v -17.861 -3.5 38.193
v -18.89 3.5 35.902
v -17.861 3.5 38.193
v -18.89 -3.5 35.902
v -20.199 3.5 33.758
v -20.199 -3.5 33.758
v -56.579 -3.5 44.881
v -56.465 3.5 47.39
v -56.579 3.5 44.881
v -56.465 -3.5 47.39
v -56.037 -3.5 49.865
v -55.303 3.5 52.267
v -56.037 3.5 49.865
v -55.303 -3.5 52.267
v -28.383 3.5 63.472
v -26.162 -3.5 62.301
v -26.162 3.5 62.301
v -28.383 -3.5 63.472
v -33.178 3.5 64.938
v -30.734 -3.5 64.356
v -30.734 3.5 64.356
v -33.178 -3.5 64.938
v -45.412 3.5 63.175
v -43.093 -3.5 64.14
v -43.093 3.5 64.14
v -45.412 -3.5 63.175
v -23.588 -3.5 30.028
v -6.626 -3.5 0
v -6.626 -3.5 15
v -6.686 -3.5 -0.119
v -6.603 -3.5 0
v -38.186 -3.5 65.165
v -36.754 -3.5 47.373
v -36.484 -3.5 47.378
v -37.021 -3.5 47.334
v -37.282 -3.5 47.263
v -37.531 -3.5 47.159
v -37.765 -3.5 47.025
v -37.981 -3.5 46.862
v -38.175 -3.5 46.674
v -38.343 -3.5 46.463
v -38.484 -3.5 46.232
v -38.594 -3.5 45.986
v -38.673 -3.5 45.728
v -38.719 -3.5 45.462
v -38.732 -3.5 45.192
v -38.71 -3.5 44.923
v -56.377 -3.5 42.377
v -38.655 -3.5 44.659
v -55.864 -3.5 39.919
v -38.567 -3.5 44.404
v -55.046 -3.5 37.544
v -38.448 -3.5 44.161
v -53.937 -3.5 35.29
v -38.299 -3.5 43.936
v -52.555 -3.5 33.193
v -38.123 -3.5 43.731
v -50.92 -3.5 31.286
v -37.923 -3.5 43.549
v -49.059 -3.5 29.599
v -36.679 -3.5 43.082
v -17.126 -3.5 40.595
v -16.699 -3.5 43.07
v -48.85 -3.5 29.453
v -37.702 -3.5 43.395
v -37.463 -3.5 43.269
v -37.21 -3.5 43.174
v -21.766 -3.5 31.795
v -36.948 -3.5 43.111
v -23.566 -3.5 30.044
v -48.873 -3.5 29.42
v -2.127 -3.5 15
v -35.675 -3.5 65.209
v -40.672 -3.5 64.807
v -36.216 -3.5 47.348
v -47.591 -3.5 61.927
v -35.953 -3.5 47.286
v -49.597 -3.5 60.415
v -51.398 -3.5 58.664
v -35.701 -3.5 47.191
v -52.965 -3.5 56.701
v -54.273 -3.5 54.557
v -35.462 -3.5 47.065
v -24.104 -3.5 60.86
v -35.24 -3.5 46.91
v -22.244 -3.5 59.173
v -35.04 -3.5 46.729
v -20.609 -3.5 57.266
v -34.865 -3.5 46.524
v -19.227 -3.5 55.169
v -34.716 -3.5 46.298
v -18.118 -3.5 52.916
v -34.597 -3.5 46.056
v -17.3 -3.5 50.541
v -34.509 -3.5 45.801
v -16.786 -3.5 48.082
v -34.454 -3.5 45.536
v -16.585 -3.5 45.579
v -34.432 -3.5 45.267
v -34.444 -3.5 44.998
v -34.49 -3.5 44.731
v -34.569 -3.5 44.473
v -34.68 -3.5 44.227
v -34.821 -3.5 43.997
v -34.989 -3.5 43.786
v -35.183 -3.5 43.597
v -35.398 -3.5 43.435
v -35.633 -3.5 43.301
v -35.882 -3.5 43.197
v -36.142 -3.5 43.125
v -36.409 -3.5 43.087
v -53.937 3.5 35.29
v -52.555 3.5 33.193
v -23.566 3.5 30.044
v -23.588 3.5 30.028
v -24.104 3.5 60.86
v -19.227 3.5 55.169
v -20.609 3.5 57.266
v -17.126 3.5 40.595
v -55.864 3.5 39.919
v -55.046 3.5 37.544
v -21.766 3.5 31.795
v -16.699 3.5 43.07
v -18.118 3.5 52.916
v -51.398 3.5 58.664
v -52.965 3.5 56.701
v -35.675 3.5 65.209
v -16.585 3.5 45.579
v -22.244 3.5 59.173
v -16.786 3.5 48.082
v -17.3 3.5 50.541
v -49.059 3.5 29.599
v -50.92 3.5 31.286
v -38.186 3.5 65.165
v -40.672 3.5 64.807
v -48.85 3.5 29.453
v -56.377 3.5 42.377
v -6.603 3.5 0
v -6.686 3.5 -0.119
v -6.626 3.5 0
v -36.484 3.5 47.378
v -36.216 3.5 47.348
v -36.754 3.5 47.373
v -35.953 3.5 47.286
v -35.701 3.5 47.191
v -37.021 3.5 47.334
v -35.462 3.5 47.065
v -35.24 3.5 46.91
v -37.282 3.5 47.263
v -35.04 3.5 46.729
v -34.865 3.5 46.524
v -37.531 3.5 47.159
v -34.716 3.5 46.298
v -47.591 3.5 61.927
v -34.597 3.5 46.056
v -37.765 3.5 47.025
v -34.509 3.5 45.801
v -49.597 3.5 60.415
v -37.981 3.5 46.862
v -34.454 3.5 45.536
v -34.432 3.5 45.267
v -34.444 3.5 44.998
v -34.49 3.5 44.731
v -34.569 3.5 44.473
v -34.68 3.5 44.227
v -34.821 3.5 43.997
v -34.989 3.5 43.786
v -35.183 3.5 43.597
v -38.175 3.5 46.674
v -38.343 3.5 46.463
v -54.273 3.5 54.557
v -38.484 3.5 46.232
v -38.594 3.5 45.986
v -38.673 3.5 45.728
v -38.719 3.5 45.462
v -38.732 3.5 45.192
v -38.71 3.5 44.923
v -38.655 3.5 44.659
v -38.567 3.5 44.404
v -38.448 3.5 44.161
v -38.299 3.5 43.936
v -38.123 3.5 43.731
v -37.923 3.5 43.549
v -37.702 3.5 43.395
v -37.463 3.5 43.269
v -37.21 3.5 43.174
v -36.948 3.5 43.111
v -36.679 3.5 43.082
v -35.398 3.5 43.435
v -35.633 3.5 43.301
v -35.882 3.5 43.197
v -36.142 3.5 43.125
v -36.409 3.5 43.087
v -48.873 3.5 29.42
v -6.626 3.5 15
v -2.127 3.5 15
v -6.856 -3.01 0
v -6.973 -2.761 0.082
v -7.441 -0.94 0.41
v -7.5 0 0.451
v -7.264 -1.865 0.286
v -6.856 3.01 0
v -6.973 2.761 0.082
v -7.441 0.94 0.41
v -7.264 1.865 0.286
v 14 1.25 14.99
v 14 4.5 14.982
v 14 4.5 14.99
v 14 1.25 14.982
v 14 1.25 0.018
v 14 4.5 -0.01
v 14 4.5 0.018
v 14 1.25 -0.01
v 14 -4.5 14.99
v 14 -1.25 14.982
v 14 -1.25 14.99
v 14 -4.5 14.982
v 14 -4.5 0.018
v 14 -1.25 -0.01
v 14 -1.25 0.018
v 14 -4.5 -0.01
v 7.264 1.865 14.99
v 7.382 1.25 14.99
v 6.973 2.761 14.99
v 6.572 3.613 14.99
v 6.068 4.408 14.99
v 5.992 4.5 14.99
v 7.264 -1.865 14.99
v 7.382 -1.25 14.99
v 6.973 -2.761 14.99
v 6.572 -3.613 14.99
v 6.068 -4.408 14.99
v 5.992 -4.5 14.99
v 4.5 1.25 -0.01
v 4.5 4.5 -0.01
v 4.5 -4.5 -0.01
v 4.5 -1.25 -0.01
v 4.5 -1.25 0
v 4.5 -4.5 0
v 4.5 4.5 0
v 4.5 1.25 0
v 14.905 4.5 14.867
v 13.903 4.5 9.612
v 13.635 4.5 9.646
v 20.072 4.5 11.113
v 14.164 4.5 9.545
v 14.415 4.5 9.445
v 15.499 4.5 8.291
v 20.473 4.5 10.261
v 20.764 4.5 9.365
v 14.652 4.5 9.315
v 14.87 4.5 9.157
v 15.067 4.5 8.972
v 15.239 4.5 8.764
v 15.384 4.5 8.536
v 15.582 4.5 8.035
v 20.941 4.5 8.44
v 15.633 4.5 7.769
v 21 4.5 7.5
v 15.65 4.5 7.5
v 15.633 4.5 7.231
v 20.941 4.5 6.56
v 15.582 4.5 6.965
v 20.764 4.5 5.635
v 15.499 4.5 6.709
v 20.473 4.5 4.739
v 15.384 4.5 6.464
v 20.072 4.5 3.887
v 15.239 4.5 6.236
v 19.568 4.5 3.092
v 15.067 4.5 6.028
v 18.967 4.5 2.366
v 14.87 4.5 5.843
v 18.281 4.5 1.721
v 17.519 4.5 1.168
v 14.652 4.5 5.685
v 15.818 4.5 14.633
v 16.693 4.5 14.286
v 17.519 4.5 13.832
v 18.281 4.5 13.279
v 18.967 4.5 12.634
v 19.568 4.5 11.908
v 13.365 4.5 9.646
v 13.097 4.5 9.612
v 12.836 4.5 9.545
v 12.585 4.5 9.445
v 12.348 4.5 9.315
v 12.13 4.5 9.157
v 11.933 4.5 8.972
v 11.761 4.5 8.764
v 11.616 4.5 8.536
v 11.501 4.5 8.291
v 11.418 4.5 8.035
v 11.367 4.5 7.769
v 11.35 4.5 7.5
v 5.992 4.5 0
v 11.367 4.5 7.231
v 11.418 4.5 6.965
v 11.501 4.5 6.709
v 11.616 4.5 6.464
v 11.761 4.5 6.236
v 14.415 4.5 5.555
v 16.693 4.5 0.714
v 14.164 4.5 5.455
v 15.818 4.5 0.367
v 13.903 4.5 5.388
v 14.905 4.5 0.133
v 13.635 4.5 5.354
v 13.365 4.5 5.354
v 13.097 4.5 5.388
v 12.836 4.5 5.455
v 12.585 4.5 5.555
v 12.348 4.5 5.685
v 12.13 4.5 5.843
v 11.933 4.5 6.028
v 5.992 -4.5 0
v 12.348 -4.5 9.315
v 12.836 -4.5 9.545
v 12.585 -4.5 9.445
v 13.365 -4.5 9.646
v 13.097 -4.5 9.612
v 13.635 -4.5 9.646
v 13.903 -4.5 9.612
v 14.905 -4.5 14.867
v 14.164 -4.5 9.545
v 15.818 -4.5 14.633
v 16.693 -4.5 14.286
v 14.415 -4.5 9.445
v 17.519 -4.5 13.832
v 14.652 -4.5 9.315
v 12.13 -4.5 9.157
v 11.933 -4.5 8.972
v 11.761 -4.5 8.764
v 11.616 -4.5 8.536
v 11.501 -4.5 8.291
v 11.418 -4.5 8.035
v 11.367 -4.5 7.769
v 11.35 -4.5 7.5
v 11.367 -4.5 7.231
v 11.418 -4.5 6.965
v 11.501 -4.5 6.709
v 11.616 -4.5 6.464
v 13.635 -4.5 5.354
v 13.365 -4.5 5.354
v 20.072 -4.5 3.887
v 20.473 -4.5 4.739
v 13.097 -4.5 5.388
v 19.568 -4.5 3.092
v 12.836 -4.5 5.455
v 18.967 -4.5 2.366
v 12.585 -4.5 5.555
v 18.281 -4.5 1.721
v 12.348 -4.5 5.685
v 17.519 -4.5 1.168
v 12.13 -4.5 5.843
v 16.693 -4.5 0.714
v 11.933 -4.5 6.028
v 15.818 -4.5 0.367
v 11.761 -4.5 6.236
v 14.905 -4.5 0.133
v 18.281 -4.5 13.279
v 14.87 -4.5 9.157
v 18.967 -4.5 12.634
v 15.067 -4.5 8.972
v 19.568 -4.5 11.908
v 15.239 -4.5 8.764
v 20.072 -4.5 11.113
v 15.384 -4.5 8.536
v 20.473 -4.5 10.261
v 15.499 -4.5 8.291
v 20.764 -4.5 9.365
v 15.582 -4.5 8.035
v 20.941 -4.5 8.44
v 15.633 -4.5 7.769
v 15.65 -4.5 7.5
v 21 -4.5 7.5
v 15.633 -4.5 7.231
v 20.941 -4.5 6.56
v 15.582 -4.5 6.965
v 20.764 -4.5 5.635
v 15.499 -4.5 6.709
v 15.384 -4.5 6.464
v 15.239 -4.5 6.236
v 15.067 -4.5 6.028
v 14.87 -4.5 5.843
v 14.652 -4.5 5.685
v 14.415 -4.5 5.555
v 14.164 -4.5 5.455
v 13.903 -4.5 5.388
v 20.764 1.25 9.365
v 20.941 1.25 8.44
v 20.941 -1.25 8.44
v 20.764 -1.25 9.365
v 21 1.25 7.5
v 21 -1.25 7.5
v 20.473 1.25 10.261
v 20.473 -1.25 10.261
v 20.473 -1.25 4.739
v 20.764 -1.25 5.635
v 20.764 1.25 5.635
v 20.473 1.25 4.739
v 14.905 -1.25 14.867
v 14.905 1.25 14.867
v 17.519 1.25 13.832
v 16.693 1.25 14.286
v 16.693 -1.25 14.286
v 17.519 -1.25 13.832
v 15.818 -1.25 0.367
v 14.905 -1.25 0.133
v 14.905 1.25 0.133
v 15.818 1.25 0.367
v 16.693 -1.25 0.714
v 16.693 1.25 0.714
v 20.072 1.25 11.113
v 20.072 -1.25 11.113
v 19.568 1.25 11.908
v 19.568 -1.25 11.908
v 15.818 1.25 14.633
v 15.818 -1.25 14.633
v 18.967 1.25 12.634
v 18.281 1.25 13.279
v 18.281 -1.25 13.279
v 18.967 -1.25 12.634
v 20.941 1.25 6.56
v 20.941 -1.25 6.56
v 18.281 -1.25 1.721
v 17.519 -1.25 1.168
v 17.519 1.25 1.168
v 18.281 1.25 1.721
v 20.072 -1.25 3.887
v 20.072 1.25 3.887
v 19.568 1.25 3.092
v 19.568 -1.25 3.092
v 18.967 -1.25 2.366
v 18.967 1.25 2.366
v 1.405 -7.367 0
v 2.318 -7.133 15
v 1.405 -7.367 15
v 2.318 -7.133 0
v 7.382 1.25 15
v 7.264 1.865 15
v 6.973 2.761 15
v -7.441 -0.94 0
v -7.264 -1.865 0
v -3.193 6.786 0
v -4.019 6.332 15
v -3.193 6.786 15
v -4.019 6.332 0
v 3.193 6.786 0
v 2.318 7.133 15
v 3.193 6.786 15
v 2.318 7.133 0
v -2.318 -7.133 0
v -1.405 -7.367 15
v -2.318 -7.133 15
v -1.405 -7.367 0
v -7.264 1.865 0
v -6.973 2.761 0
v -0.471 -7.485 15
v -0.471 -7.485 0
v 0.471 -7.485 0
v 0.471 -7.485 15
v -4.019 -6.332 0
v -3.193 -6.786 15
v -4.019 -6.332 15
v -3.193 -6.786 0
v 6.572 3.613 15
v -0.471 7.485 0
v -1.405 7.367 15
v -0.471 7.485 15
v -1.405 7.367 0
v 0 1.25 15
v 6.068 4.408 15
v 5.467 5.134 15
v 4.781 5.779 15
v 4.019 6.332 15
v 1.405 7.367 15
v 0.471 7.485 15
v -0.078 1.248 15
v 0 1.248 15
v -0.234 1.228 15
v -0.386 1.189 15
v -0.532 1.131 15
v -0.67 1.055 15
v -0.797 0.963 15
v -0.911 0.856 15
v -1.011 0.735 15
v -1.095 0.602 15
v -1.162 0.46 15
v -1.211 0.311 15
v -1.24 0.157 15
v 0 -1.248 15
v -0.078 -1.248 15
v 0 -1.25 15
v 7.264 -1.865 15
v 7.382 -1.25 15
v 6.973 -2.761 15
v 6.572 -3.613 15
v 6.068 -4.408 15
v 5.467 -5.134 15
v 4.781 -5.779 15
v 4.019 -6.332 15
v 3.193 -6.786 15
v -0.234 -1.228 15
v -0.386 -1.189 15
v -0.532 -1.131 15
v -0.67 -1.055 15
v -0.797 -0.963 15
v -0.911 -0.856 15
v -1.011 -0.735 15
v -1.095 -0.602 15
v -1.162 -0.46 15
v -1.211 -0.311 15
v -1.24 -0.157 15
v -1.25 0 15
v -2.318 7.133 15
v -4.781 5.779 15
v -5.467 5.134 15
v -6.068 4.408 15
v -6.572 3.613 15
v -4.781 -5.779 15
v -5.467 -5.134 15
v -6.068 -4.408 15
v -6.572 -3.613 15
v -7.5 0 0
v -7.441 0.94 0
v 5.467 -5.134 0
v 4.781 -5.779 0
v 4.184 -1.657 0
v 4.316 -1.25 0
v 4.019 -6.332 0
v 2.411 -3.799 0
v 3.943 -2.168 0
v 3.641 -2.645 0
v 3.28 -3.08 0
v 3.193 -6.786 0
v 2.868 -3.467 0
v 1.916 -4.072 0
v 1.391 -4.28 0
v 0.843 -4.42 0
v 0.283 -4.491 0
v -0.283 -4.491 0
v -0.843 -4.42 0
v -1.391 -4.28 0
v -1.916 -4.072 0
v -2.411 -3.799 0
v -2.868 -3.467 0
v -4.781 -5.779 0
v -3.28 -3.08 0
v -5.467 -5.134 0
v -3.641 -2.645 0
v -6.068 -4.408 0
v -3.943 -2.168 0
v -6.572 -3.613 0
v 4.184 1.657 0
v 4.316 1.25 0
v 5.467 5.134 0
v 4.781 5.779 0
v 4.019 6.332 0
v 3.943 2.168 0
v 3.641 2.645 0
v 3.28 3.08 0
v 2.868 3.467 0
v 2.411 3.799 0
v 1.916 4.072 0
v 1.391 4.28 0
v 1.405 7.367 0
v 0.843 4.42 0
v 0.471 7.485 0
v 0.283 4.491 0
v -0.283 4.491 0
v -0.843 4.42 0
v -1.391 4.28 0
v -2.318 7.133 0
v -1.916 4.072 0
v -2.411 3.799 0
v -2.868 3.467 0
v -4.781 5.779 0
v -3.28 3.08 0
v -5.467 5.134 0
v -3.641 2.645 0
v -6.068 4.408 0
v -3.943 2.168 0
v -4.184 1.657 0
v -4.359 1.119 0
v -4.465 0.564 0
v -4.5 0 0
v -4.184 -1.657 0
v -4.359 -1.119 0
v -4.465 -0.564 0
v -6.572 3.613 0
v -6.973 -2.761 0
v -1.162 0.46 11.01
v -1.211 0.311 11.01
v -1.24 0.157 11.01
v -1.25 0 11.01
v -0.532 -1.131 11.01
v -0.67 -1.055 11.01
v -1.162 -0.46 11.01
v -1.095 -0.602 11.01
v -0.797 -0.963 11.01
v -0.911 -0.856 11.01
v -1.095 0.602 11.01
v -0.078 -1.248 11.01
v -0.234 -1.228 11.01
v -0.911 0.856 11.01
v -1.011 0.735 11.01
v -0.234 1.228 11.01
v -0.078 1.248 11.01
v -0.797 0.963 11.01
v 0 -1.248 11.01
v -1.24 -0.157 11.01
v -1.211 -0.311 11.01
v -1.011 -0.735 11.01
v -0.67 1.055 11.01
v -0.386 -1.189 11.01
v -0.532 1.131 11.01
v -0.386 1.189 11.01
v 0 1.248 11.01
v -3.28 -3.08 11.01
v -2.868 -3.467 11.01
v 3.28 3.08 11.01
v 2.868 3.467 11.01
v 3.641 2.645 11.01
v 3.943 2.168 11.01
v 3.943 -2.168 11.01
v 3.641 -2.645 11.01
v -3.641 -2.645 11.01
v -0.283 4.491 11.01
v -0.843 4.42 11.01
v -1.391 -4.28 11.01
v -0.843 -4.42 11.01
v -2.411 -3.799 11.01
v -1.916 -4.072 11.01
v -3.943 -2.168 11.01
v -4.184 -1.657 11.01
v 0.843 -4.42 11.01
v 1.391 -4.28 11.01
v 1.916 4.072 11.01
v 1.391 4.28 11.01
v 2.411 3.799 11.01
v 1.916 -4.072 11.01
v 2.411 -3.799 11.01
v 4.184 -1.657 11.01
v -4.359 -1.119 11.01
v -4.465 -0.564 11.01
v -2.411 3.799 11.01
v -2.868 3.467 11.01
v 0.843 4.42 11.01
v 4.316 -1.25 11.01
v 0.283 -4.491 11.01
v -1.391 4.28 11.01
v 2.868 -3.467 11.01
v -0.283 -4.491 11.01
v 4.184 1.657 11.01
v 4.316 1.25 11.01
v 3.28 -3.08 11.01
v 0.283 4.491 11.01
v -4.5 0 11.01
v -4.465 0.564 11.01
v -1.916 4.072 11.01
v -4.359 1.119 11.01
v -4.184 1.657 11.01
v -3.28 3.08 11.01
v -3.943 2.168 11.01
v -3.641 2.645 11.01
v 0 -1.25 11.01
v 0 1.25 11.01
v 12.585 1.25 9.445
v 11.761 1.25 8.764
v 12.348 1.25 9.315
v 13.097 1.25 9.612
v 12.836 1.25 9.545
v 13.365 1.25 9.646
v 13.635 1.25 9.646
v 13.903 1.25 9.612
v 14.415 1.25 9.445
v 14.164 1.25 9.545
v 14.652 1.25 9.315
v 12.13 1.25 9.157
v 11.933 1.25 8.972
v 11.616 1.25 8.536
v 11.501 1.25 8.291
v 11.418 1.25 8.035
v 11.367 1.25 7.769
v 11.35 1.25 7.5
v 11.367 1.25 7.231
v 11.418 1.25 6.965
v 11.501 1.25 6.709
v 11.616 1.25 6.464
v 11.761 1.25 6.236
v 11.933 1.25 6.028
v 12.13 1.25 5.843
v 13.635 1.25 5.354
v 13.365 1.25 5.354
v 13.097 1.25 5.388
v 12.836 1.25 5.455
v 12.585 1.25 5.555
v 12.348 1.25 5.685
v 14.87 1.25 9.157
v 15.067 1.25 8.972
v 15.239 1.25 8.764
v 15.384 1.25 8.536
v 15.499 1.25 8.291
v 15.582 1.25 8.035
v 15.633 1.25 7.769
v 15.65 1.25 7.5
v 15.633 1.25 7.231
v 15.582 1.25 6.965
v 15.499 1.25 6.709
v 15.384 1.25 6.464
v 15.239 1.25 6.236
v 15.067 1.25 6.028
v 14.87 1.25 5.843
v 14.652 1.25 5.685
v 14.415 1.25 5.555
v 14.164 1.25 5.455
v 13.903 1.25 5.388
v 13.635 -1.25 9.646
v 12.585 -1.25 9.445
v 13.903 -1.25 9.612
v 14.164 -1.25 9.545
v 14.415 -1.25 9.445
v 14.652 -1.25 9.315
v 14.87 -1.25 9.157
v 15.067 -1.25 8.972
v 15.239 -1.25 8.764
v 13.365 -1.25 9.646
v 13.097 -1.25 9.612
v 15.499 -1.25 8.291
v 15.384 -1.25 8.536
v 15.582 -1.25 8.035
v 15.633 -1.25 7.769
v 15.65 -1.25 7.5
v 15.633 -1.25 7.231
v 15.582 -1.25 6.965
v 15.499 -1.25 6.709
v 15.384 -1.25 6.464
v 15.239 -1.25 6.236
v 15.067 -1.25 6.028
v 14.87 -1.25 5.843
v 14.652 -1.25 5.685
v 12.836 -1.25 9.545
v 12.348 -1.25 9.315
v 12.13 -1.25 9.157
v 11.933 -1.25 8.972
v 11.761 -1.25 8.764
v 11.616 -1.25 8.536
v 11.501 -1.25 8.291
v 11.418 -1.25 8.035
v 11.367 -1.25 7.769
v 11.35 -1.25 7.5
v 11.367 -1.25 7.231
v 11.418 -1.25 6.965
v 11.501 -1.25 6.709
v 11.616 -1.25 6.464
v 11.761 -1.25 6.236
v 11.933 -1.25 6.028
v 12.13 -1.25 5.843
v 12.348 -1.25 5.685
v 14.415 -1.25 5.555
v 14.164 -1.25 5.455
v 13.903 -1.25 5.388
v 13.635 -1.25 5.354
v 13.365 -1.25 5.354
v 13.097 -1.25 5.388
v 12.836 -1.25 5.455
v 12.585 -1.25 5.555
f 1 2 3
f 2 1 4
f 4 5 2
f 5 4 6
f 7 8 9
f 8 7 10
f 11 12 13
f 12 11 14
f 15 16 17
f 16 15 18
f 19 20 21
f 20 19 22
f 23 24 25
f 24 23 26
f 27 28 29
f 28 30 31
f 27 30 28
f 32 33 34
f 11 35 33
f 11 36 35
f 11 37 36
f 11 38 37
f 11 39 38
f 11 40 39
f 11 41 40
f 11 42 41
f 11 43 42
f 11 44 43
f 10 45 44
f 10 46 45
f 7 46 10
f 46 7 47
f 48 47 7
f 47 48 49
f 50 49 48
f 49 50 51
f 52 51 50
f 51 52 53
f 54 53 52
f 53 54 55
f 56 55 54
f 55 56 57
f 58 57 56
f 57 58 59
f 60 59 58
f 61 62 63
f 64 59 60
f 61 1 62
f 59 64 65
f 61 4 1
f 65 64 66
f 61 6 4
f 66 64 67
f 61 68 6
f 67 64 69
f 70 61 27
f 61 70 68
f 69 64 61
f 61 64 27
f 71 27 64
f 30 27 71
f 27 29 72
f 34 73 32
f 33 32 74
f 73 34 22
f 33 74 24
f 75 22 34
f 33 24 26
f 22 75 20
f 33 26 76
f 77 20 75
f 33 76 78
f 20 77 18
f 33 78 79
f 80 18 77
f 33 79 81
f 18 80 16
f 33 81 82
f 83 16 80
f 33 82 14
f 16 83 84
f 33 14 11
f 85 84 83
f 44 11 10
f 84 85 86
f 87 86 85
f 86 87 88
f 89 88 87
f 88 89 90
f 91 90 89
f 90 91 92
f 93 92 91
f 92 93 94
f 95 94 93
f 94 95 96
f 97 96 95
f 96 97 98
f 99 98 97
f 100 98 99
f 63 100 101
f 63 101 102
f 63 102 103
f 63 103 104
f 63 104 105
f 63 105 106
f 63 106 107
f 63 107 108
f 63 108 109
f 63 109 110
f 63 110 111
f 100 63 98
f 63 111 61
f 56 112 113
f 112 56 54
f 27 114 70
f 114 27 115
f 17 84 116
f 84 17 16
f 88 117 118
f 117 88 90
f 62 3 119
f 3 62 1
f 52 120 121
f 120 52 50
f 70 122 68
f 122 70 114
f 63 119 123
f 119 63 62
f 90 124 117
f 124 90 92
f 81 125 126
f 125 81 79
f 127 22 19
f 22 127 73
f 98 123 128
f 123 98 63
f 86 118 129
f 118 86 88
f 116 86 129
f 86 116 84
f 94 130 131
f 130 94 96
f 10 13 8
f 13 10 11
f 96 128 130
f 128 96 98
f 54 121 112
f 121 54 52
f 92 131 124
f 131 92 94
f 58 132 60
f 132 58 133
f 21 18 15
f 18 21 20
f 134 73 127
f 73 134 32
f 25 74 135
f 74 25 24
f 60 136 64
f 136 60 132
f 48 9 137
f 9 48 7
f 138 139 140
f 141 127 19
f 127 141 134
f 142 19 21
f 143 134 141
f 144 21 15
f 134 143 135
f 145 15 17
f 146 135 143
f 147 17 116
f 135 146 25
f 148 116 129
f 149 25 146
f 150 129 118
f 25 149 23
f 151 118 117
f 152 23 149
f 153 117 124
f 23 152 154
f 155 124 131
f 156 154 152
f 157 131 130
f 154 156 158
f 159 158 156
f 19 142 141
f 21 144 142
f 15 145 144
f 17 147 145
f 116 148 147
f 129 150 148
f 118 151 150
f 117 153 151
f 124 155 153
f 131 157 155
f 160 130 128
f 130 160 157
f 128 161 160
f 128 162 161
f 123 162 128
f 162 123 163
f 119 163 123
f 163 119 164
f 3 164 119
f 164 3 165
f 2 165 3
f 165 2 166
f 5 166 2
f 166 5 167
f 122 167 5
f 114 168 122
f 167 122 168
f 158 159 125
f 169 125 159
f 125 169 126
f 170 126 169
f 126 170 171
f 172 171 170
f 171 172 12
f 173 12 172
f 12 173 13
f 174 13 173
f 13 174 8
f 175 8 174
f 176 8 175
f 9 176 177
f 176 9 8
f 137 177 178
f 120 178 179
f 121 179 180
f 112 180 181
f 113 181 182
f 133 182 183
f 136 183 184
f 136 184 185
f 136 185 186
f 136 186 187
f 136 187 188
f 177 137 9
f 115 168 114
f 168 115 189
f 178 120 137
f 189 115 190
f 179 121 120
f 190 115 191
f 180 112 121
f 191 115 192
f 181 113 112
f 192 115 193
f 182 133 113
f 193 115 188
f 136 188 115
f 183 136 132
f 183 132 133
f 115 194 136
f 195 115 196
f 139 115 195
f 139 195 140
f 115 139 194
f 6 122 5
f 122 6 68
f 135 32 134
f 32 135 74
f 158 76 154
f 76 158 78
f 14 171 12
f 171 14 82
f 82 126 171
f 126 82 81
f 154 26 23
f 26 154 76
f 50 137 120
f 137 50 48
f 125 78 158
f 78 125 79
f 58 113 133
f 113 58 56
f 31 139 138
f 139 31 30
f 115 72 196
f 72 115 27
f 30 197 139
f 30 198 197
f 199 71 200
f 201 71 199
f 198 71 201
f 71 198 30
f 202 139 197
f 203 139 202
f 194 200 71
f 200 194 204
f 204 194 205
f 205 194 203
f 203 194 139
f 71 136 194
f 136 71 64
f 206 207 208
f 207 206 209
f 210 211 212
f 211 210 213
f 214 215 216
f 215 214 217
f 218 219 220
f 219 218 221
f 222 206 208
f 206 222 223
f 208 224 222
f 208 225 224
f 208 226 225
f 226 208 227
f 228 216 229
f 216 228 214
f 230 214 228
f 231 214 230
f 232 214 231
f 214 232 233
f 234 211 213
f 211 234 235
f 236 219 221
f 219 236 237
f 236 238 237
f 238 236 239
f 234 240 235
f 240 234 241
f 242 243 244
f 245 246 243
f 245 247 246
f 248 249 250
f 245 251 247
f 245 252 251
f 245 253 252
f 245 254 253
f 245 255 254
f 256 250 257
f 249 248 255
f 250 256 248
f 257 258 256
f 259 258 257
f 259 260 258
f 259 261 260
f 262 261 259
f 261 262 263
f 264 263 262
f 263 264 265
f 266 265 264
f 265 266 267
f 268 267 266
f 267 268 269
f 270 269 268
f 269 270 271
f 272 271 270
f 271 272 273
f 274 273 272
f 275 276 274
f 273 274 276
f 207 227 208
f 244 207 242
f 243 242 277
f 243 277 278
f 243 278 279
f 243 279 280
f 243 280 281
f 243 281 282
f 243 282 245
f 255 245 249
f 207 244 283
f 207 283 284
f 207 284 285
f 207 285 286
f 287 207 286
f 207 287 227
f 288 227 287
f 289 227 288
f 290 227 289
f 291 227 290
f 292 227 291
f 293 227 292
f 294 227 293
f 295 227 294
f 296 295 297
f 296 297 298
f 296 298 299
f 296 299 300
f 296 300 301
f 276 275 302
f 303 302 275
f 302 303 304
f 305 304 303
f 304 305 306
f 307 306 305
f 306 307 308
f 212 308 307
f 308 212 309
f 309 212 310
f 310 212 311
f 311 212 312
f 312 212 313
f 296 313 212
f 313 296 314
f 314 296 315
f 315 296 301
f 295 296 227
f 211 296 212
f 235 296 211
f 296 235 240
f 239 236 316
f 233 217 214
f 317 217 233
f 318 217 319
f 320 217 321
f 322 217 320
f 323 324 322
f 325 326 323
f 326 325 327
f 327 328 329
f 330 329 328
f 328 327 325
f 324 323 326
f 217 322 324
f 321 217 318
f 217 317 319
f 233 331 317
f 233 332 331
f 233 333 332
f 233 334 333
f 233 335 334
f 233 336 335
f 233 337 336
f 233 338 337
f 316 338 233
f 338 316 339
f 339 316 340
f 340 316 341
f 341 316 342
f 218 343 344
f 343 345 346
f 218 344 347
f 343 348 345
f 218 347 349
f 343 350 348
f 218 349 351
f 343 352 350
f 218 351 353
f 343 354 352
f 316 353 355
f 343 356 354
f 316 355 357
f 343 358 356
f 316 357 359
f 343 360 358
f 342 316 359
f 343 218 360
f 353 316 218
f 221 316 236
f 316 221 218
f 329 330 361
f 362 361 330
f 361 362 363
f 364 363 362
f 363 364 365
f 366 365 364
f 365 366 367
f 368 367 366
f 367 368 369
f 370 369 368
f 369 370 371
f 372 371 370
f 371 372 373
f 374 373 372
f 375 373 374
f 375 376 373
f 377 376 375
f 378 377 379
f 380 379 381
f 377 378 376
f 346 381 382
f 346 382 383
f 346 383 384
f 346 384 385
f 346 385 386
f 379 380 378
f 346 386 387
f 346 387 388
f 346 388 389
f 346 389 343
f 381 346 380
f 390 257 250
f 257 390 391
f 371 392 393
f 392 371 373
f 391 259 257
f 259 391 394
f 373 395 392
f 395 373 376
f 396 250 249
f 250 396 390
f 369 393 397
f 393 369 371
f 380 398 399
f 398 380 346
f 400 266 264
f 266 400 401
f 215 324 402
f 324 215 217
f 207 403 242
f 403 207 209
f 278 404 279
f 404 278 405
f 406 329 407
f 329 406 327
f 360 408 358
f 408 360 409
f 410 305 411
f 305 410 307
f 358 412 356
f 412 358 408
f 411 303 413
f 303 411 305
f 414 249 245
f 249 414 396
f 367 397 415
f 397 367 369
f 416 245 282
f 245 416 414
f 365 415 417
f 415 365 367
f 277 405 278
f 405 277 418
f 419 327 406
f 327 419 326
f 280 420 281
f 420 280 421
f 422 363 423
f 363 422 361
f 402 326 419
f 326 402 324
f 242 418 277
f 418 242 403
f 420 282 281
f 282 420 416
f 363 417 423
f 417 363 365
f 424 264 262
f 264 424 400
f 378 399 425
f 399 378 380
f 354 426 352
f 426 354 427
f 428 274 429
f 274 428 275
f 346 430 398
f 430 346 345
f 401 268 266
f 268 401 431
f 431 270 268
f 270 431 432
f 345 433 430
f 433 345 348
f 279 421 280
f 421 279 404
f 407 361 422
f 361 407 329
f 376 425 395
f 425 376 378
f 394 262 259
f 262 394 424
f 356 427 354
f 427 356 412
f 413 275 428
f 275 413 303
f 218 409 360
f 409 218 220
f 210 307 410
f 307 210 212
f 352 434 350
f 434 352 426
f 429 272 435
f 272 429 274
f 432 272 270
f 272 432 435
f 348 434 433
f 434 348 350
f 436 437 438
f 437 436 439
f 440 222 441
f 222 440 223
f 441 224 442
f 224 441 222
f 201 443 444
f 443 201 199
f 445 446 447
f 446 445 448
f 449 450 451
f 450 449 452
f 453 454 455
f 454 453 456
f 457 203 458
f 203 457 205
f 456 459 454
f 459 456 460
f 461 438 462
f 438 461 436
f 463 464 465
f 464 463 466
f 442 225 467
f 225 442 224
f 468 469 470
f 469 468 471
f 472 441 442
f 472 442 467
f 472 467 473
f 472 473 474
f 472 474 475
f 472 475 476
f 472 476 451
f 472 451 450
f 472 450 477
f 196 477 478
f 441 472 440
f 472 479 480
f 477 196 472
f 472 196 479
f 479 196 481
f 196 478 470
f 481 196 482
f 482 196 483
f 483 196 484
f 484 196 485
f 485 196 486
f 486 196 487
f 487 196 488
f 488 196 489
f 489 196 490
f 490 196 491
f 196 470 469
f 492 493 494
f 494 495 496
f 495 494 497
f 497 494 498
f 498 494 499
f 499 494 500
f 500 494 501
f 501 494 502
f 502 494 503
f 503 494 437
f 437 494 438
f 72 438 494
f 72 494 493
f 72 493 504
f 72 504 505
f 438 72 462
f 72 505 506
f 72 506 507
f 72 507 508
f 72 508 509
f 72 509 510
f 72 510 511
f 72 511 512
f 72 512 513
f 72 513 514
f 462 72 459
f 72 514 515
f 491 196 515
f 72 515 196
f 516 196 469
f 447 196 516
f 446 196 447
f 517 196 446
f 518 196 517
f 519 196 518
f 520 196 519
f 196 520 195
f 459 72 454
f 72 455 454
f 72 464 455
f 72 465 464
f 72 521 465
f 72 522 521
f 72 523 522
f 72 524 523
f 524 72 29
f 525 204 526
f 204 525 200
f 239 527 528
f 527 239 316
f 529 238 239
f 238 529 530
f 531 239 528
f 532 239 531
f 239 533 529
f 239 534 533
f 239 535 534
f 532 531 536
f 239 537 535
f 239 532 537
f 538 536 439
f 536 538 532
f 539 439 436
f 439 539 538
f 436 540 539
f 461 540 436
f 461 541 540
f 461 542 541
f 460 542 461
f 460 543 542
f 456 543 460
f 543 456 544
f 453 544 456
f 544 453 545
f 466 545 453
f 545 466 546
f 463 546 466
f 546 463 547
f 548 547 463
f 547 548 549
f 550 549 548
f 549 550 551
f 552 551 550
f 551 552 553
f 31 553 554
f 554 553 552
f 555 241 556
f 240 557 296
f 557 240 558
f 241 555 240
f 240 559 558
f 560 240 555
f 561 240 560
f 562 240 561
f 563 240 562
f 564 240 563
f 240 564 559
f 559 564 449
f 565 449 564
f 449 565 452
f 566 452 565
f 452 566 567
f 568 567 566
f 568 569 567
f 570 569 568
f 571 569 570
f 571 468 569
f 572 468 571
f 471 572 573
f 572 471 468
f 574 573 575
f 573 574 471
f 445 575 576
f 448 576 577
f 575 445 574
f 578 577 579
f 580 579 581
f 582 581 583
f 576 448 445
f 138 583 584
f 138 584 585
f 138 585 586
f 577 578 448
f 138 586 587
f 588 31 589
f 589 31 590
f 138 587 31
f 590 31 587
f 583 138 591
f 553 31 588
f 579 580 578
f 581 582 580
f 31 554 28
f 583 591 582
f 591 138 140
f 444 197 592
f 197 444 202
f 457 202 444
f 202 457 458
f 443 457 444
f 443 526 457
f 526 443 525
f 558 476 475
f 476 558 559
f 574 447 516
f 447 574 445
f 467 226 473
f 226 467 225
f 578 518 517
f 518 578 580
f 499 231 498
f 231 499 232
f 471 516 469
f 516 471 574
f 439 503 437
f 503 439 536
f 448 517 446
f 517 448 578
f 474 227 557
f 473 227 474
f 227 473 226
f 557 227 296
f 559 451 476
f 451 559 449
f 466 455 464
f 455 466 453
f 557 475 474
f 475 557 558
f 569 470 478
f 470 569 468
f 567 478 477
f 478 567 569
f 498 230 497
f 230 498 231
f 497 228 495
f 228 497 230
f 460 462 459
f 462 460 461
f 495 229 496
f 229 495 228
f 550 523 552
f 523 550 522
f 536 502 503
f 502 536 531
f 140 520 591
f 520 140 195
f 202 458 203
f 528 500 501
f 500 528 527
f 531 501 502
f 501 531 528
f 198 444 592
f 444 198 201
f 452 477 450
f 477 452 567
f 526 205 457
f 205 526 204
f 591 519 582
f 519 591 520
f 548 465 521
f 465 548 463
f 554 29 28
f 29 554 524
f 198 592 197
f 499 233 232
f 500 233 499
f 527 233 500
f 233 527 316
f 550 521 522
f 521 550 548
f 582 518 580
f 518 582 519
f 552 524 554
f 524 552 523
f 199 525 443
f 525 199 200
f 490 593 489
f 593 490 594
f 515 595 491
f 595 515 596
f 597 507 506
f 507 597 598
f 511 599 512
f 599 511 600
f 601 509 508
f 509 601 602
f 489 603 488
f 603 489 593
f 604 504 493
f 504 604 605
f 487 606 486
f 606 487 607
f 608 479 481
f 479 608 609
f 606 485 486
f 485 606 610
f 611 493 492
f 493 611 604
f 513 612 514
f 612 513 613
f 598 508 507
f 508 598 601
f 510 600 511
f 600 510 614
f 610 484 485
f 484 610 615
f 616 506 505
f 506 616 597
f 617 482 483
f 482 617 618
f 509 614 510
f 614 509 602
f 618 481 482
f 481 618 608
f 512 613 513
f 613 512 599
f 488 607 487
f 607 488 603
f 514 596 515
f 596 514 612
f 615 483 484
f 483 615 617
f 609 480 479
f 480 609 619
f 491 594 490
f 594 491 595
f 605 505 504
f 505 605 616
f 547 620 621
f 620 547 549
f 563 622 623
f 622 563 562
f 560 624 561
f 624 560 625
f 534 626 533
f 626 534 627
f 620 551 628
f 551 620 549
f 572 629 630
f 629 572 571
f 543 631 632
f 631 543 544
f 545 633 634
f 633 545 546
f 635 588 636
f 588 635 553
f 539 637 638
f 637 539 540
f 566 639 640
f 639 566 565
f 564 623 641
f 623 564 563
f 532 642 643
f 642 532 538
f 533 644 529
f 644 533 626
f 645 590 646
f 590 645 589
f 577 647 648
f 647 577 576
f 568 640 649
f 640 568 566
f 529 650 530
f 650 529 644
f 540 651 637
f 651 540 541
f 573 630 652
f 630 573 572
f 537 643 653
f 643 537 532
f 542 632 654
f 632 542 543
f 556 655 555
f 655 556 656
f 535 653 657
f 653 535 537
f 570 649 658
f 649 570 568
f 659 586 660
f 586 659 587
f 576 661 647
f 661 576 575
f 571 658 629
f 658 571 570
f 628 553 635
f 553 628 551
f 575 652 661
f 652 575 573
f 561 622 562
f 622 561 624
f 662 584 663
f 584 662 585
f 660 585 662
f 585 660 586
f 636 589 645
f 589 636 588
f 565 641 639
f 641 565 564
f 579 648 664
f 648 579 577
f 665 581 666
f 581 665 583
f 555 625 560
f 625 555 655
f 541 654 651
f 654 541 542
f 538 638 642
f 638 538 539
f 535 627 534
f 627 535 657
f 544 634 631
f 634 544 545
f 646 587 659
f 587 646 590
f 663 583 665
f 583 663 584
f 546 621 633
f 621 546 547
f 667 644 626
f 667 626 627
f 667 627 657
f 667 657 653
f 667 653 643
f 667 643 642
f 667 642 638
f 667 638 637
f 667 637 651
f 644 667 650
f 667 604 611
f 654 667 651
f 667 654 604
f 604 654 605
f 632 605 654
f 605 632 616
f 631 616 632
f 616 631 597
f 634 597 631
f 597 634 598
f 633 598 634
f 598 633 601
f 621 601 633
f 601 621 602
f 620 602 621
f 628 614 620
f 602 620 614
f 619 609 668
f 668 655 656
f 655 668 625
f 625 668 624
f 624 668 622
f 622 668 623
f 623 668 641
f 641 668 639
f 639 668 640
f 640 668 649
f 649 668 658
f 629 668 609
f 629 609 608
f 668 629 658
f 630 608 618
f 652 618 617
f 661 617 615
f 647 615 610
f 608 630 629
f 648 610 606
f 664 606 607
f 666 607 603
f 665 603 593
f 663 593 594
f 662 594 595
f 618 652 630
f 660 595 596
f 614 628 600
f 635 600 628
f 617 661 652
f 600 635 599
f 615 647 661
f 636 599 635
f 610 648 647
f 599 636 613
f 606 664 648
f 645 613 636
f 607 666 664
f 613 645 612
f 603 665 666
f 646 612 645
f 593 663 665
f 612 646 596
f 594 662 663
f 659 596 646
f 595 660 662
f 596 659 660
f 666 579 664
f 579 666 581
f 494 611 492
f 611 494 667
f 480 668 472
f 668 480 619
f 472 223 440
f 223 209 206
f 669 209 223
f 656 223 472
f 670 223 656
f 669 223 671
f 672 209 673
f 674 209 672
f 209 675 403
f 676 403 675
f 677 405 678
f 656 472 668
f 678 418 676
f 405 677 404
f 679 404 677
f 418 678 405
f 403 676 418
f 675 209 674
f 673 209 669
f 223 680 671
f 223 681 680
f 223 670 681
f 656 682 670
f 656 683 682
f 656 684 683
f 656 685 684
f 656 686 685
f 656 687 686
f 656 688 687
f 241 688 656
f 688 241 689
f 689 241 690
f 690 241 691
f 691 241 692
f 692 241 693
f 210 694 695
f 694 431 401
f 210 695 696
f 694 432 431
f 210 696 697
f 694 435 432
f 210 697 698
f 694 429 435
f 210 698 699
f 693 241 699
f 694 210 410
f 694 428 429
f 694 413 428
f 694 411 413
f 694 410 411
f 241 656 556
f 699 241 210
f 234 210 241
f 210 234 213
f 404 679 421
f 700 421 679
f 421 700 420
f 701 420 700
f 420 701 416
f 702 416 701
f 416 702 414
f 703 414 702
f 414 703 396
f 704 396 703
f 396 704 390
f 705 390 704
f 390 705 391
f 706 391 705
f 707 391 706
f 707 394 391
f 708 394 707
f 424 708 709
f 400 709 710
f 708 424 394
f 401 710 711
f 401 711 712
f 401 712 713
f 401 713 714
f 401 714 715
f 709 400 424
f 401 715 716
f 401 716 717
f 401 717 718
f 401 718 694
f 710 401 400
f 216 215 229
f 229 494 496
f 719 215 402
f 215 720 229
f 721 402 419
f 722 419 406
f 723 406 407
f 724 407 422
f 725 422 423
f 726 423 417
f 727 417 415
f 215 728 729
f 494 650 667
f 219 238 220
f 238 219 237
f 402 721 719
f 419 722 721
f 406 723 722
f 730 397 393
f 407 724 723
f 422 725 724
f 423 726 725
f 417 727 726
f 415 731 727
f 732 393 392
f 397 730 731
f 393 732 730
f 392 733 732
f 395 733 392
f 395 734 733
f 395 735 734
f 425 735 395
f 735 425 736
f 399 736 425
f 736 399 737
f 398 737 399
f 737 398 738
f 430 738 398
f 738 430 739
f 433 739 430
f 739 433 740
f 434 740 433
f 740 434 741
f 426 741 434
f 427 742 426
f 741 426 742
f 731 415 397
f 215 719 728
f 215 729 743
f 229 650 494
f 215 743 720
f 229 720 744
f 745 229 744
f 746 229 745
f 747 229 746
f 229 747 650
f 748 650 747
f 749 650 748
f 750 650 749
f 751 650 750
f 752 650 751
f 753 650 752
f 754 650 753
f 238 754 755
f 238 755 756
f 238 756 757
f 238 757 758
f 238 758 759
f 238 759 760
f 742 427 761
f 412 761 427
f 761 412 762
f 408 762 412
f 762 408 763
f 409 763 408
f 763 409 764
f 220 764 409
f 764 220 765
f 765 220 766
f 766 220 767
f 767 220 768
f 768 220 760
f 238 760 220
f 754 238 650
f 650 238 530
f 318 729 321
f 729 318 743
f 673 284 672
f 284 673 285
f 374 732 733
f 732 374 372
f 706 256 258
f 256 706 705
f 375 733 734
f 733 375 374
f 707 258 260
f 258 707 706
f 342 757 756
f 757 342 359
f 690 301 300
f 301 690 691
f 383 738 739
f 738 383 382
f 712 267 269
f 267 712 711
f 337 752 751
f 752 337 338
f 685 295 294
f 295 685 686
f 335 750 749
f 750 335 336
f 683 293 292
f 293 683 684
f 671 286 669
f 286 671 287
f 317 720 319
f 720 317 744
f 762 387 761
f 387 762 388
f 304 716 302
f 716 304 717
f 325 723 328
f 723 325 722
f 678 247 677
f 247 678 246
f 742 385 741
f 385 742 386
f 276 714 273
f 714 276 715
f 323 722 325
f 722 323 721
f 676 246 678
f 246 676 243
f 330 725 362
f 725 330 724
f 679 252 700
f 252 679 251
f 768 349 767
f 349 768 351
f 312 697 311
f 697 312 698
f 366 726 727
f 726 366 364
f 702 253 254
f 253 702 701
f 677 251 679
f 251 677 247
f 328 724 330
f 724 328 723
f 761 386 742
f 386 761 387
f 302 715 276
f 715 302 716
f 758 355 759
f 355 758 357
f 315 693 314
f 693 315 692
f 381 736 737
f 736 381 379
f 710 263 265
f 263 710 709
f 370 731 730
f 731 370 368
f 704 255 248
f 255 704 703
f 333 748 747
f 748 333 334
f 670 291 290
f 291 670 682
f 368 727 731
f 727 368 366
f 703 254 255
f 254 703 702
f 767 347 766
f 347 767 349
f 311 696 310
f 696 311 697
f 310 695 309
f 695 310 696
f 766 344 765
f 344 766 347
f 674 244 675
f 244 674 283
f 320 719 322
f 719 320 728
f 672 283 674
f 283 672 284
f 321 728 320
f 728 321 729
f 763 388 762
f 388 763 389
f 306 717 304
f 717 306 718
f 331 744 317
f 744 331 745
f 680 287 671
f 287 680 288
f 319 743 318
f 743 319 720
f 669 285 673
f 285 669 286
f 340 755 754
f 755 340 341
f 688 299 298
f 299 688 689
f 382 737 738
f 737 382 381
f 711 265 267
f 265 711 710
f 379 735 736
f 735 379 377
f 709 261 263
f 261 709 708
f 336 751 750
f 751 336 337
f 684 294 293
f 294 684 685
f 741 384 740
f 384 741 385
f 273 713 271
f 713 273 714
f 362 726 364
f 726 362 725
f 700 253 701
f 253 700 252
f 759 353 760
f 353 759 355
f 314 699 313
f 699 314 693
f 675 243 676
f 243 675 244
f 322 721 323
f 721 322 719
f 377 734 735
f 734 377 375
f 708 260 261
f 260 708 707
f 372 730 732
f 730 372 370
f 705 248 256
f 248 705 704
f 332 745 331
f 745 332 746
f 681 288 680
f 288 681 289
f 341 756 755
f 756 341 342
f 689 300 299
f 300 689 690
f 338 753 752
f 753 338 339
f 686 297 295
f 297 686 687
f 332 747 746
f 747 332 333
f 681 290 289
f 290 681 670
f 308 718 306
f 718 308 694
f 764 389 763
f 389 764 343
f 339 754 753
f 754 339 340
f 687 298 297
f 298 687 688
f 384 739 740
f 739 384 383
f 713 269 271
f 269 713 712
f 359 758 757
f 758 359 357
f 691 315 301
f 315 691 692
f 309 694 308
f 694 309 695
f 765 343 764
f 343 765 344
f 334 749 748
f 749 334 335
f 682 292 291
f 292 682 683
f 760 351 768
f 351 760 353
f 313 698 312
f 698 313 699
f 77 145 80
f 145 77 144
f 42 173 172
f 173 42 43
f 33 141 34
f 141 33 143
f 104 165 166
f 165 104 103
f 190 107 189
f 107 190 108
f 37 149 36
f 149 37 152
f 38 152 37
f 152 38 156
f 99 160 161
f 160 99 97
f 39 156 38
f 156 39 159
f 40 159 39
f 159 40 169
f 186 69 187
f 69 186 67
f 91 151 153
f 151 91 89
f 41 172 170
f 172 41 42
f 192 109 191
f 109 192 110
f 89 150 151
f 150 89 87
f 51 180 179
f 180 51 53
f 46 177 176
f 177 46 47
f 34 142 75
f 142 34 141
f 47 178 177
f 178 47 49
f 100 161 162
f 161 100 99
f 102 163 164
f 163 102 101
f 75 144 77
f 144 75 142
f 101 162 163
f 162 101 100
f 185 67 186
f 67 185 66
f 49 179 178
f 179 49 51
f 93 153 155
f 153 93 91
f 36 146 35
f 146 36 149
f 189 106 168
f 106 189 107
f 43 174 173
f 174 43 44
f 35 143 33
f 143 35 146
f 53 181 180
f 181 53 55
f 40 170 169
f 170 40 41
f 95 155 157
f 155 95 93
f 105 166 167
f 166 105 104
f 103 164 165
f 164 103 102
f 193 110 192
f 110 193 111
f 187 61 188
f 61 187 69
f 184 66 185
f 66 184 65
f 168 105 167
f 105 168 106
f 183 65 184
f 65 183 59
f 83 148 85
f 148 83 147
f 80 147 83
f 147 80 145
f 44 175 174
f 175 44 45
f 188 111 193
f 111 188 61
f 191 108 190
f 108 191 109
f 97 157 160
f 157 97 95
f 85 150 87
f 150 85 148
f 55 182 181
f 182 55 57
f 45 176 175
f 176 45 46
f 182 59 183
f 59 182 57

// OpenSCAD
AntennaHeadDiameter = 9;
AntennaHeadWall = 3;
AntennaHeadLength = 11;
AntennaDiameter = 2.5;
AntennaMountLength = 15;
MountLength = 20;
Slot = AntennaDiameter;

LifeCamWall = 2.5;
LifeCamHousingDiameter = 30;
LifeCamDiameter = LifeCamHousingDiameter + 2 * LifeCamWall;
LifeCamLength = 30;
LifeCamSpeakerOffset = 15;
LifeCamSpeakerWidth = 15;
LifeCamMountOffset = 15;
LifeCamMountWidth = 20;
LifeCamMountOffset = 20;
LifeCamPivotWidth = 20;

M4ScrewDiameter = 4.3;

CounterWeightDiameter = 40;
CounterWeightWidth = 7;
CounterWeightLength = CounterWeightDiameter/2 + 5;
CounterWeightOffset = 30;

MountWing =  AntennaHeadDiameter;

kFudge = .01;
$fn=50;
module LifeCamHousing()
{
    difference()
    {
        union()
        {
            cylinder(h=LifeCamLength, d=LifeCamDiameter);
        
            translate([-LifeCamPivotWidth/2,AntennaMountLength/2-LifeCamDiameter+1, LifeCamLength-LifeCamSpeakerWidth-kFudge])
                cube([LifeCamPivotWidth, 
                        AntennaMountLength/2+5, 
                        AntennaMountLength]);

            translate([-LifeCamPivotWidth/2,AntennaMountLength/2-LifeCamDiameter+1, LifeCamLength-LifeCamSpeakerWidth-kFudge])
                cube([LifeCamPivotWidth, 
                        AntennaMountLength/2+5, 
                        AntennaMountLength]);

            rotate([90, 0, 90])
                translate([-LifeCamDiameter+1 + AntennaMountLength/2, AntennaMountLength/2 + LifeCamLength-LifeCamSpeakerWidth-kFudge, -LifeCamPivotWidth/2])
                cylinder(h=LifeCamPivotWidth, d=AntennaMountLength);
        }
        translate([-LifeCamSpeakerOffset/2,LifeCamHousingDiameter/2 - LifeCamSpeakerWidth/2,-kFudge])
            cube([LifeCamSpeakerWidth, 
                     LifeCamSpeakerWidth, 
                        LifeCamLength - LifeCamSpeakerOffset]);
        
        translate([-LifeCamMountOffset/2,-LifeCamHousingDiameter,-kFudge])
            cube([LifeCamMountWidth, 
                     LifeCamMountWidth, 
                        LifeCamLength - LifeCamMountOffset]);
		translate([0, 0, -kFudge])
		cylinder(h=LifeCamLength + 2 * kFudge, 
                d=LifeCamDiameter - 2 * LifeCamWall);
		
        translate([-AntennaHeadDiameter/2, -LifeCamDiameter,LifeCamLength -2*AntennaHeadDiameter -2*kFudge])
                cube([AntennaHeadDiameter, 
                      3*AntennaHeadDiameter, 
                      MountLength + 2 * kFudge]);
        
            rotate([90, 0, 90])
                translate([-LifeCamDiameter+1 + AntennaMountLength/2, AntennaMountLength/2 + LifeCamLength-LifeCamSpeakerWidth-kFudge, -LifeCamPivotWidth/2])
            cylinder(h=2*AntennaMountLength, d=M4ScrewDiameter);
    }
}

module AntennaMountClip()
{
    difference()
    {
        union()
        {
            translate([AntennaHeadDiameter/2, -AntennaHeadDiameter/2,-kFudge])
            cube([AntennaMountLength/2 + 2, 
                AntennaHeadDiameter, 
                AntennaMountLength]);
            rotate([90, 0, 0])
            translate([AntennaHeadDiameter + AntennaHeadDiameter/2, AntennaMountLength/2, -AntennaHeadDiameter/2])
            cylinder(h=AntennaHeadDiameter, d=AntennaMountLength);
            
            cylinder(h=AntennaMountLength, d=AntennaHeadDiameter + 2 * AntennaHeadWall);


			translate([-3,0,-2.7])
			rotate([0, 35, 0])
			{
			translate([-CounterWeightLength - CounterWeightOffset, CounterWeightWidth/2, CounterWeightDiameter/2])
			rotate([90,0, 0])
            cylinder(h=CounterWeightWidth, d=CounterWeightDiameter);
			
			translate([-CounterWeightOffset - AntennaHeadDiameter - CounterWeightDiameter/2 + 3, -CounterWeightWidth/2, 0])
            cube([CounterWeightOffset + AntennaHeadDiameter/2 + CounterWeightDiameter/2 - 3, 
                CounterWeightWidth, 
                AntennaMountLength]);
			}
        }
        
    
        union()
        {
            translate([0, 0, -kFudge])
            cylinder(h=AntennaMountLength+2*kFudge, d=AntennaDiameter);
            translate([0, 0, -kFudge])
            cylinder(h=AntennaHeadLength+2*kFudge, d=AntennaHeadDiameter);

            translate([0, -Slot/2,-2*kFudge])
                cube([3*AntennaHeadDiameter, 
                      Slot, 
                      MountLength + 2 * kFudge]);
            
            rotate([90, 0, 0])
            translate([AntennaHeadDiameter + AntennaHeadDiameter/2, AntennaMountLength/2, -AntennaMountLength/2])
            cylinder(h=AntennaMountLength, d=M4ScrewDiameter);
			
			translate([-3,0,-2.7])
			rotate([0, 35, 0])
			translate([-CounterWeightLength - CounterWeightOffset, CounterWeightWidth/2 + kFudge, CounterWeightDiameter/2])
			rotate([90,0, 0])
            cylinder(h=CounterWeightWidth + 2 * kFudge, d=M4ScrewDiameter);
			
			
            
        }
    }
}

AntennaMountClip();
//LifeCamHousing();
